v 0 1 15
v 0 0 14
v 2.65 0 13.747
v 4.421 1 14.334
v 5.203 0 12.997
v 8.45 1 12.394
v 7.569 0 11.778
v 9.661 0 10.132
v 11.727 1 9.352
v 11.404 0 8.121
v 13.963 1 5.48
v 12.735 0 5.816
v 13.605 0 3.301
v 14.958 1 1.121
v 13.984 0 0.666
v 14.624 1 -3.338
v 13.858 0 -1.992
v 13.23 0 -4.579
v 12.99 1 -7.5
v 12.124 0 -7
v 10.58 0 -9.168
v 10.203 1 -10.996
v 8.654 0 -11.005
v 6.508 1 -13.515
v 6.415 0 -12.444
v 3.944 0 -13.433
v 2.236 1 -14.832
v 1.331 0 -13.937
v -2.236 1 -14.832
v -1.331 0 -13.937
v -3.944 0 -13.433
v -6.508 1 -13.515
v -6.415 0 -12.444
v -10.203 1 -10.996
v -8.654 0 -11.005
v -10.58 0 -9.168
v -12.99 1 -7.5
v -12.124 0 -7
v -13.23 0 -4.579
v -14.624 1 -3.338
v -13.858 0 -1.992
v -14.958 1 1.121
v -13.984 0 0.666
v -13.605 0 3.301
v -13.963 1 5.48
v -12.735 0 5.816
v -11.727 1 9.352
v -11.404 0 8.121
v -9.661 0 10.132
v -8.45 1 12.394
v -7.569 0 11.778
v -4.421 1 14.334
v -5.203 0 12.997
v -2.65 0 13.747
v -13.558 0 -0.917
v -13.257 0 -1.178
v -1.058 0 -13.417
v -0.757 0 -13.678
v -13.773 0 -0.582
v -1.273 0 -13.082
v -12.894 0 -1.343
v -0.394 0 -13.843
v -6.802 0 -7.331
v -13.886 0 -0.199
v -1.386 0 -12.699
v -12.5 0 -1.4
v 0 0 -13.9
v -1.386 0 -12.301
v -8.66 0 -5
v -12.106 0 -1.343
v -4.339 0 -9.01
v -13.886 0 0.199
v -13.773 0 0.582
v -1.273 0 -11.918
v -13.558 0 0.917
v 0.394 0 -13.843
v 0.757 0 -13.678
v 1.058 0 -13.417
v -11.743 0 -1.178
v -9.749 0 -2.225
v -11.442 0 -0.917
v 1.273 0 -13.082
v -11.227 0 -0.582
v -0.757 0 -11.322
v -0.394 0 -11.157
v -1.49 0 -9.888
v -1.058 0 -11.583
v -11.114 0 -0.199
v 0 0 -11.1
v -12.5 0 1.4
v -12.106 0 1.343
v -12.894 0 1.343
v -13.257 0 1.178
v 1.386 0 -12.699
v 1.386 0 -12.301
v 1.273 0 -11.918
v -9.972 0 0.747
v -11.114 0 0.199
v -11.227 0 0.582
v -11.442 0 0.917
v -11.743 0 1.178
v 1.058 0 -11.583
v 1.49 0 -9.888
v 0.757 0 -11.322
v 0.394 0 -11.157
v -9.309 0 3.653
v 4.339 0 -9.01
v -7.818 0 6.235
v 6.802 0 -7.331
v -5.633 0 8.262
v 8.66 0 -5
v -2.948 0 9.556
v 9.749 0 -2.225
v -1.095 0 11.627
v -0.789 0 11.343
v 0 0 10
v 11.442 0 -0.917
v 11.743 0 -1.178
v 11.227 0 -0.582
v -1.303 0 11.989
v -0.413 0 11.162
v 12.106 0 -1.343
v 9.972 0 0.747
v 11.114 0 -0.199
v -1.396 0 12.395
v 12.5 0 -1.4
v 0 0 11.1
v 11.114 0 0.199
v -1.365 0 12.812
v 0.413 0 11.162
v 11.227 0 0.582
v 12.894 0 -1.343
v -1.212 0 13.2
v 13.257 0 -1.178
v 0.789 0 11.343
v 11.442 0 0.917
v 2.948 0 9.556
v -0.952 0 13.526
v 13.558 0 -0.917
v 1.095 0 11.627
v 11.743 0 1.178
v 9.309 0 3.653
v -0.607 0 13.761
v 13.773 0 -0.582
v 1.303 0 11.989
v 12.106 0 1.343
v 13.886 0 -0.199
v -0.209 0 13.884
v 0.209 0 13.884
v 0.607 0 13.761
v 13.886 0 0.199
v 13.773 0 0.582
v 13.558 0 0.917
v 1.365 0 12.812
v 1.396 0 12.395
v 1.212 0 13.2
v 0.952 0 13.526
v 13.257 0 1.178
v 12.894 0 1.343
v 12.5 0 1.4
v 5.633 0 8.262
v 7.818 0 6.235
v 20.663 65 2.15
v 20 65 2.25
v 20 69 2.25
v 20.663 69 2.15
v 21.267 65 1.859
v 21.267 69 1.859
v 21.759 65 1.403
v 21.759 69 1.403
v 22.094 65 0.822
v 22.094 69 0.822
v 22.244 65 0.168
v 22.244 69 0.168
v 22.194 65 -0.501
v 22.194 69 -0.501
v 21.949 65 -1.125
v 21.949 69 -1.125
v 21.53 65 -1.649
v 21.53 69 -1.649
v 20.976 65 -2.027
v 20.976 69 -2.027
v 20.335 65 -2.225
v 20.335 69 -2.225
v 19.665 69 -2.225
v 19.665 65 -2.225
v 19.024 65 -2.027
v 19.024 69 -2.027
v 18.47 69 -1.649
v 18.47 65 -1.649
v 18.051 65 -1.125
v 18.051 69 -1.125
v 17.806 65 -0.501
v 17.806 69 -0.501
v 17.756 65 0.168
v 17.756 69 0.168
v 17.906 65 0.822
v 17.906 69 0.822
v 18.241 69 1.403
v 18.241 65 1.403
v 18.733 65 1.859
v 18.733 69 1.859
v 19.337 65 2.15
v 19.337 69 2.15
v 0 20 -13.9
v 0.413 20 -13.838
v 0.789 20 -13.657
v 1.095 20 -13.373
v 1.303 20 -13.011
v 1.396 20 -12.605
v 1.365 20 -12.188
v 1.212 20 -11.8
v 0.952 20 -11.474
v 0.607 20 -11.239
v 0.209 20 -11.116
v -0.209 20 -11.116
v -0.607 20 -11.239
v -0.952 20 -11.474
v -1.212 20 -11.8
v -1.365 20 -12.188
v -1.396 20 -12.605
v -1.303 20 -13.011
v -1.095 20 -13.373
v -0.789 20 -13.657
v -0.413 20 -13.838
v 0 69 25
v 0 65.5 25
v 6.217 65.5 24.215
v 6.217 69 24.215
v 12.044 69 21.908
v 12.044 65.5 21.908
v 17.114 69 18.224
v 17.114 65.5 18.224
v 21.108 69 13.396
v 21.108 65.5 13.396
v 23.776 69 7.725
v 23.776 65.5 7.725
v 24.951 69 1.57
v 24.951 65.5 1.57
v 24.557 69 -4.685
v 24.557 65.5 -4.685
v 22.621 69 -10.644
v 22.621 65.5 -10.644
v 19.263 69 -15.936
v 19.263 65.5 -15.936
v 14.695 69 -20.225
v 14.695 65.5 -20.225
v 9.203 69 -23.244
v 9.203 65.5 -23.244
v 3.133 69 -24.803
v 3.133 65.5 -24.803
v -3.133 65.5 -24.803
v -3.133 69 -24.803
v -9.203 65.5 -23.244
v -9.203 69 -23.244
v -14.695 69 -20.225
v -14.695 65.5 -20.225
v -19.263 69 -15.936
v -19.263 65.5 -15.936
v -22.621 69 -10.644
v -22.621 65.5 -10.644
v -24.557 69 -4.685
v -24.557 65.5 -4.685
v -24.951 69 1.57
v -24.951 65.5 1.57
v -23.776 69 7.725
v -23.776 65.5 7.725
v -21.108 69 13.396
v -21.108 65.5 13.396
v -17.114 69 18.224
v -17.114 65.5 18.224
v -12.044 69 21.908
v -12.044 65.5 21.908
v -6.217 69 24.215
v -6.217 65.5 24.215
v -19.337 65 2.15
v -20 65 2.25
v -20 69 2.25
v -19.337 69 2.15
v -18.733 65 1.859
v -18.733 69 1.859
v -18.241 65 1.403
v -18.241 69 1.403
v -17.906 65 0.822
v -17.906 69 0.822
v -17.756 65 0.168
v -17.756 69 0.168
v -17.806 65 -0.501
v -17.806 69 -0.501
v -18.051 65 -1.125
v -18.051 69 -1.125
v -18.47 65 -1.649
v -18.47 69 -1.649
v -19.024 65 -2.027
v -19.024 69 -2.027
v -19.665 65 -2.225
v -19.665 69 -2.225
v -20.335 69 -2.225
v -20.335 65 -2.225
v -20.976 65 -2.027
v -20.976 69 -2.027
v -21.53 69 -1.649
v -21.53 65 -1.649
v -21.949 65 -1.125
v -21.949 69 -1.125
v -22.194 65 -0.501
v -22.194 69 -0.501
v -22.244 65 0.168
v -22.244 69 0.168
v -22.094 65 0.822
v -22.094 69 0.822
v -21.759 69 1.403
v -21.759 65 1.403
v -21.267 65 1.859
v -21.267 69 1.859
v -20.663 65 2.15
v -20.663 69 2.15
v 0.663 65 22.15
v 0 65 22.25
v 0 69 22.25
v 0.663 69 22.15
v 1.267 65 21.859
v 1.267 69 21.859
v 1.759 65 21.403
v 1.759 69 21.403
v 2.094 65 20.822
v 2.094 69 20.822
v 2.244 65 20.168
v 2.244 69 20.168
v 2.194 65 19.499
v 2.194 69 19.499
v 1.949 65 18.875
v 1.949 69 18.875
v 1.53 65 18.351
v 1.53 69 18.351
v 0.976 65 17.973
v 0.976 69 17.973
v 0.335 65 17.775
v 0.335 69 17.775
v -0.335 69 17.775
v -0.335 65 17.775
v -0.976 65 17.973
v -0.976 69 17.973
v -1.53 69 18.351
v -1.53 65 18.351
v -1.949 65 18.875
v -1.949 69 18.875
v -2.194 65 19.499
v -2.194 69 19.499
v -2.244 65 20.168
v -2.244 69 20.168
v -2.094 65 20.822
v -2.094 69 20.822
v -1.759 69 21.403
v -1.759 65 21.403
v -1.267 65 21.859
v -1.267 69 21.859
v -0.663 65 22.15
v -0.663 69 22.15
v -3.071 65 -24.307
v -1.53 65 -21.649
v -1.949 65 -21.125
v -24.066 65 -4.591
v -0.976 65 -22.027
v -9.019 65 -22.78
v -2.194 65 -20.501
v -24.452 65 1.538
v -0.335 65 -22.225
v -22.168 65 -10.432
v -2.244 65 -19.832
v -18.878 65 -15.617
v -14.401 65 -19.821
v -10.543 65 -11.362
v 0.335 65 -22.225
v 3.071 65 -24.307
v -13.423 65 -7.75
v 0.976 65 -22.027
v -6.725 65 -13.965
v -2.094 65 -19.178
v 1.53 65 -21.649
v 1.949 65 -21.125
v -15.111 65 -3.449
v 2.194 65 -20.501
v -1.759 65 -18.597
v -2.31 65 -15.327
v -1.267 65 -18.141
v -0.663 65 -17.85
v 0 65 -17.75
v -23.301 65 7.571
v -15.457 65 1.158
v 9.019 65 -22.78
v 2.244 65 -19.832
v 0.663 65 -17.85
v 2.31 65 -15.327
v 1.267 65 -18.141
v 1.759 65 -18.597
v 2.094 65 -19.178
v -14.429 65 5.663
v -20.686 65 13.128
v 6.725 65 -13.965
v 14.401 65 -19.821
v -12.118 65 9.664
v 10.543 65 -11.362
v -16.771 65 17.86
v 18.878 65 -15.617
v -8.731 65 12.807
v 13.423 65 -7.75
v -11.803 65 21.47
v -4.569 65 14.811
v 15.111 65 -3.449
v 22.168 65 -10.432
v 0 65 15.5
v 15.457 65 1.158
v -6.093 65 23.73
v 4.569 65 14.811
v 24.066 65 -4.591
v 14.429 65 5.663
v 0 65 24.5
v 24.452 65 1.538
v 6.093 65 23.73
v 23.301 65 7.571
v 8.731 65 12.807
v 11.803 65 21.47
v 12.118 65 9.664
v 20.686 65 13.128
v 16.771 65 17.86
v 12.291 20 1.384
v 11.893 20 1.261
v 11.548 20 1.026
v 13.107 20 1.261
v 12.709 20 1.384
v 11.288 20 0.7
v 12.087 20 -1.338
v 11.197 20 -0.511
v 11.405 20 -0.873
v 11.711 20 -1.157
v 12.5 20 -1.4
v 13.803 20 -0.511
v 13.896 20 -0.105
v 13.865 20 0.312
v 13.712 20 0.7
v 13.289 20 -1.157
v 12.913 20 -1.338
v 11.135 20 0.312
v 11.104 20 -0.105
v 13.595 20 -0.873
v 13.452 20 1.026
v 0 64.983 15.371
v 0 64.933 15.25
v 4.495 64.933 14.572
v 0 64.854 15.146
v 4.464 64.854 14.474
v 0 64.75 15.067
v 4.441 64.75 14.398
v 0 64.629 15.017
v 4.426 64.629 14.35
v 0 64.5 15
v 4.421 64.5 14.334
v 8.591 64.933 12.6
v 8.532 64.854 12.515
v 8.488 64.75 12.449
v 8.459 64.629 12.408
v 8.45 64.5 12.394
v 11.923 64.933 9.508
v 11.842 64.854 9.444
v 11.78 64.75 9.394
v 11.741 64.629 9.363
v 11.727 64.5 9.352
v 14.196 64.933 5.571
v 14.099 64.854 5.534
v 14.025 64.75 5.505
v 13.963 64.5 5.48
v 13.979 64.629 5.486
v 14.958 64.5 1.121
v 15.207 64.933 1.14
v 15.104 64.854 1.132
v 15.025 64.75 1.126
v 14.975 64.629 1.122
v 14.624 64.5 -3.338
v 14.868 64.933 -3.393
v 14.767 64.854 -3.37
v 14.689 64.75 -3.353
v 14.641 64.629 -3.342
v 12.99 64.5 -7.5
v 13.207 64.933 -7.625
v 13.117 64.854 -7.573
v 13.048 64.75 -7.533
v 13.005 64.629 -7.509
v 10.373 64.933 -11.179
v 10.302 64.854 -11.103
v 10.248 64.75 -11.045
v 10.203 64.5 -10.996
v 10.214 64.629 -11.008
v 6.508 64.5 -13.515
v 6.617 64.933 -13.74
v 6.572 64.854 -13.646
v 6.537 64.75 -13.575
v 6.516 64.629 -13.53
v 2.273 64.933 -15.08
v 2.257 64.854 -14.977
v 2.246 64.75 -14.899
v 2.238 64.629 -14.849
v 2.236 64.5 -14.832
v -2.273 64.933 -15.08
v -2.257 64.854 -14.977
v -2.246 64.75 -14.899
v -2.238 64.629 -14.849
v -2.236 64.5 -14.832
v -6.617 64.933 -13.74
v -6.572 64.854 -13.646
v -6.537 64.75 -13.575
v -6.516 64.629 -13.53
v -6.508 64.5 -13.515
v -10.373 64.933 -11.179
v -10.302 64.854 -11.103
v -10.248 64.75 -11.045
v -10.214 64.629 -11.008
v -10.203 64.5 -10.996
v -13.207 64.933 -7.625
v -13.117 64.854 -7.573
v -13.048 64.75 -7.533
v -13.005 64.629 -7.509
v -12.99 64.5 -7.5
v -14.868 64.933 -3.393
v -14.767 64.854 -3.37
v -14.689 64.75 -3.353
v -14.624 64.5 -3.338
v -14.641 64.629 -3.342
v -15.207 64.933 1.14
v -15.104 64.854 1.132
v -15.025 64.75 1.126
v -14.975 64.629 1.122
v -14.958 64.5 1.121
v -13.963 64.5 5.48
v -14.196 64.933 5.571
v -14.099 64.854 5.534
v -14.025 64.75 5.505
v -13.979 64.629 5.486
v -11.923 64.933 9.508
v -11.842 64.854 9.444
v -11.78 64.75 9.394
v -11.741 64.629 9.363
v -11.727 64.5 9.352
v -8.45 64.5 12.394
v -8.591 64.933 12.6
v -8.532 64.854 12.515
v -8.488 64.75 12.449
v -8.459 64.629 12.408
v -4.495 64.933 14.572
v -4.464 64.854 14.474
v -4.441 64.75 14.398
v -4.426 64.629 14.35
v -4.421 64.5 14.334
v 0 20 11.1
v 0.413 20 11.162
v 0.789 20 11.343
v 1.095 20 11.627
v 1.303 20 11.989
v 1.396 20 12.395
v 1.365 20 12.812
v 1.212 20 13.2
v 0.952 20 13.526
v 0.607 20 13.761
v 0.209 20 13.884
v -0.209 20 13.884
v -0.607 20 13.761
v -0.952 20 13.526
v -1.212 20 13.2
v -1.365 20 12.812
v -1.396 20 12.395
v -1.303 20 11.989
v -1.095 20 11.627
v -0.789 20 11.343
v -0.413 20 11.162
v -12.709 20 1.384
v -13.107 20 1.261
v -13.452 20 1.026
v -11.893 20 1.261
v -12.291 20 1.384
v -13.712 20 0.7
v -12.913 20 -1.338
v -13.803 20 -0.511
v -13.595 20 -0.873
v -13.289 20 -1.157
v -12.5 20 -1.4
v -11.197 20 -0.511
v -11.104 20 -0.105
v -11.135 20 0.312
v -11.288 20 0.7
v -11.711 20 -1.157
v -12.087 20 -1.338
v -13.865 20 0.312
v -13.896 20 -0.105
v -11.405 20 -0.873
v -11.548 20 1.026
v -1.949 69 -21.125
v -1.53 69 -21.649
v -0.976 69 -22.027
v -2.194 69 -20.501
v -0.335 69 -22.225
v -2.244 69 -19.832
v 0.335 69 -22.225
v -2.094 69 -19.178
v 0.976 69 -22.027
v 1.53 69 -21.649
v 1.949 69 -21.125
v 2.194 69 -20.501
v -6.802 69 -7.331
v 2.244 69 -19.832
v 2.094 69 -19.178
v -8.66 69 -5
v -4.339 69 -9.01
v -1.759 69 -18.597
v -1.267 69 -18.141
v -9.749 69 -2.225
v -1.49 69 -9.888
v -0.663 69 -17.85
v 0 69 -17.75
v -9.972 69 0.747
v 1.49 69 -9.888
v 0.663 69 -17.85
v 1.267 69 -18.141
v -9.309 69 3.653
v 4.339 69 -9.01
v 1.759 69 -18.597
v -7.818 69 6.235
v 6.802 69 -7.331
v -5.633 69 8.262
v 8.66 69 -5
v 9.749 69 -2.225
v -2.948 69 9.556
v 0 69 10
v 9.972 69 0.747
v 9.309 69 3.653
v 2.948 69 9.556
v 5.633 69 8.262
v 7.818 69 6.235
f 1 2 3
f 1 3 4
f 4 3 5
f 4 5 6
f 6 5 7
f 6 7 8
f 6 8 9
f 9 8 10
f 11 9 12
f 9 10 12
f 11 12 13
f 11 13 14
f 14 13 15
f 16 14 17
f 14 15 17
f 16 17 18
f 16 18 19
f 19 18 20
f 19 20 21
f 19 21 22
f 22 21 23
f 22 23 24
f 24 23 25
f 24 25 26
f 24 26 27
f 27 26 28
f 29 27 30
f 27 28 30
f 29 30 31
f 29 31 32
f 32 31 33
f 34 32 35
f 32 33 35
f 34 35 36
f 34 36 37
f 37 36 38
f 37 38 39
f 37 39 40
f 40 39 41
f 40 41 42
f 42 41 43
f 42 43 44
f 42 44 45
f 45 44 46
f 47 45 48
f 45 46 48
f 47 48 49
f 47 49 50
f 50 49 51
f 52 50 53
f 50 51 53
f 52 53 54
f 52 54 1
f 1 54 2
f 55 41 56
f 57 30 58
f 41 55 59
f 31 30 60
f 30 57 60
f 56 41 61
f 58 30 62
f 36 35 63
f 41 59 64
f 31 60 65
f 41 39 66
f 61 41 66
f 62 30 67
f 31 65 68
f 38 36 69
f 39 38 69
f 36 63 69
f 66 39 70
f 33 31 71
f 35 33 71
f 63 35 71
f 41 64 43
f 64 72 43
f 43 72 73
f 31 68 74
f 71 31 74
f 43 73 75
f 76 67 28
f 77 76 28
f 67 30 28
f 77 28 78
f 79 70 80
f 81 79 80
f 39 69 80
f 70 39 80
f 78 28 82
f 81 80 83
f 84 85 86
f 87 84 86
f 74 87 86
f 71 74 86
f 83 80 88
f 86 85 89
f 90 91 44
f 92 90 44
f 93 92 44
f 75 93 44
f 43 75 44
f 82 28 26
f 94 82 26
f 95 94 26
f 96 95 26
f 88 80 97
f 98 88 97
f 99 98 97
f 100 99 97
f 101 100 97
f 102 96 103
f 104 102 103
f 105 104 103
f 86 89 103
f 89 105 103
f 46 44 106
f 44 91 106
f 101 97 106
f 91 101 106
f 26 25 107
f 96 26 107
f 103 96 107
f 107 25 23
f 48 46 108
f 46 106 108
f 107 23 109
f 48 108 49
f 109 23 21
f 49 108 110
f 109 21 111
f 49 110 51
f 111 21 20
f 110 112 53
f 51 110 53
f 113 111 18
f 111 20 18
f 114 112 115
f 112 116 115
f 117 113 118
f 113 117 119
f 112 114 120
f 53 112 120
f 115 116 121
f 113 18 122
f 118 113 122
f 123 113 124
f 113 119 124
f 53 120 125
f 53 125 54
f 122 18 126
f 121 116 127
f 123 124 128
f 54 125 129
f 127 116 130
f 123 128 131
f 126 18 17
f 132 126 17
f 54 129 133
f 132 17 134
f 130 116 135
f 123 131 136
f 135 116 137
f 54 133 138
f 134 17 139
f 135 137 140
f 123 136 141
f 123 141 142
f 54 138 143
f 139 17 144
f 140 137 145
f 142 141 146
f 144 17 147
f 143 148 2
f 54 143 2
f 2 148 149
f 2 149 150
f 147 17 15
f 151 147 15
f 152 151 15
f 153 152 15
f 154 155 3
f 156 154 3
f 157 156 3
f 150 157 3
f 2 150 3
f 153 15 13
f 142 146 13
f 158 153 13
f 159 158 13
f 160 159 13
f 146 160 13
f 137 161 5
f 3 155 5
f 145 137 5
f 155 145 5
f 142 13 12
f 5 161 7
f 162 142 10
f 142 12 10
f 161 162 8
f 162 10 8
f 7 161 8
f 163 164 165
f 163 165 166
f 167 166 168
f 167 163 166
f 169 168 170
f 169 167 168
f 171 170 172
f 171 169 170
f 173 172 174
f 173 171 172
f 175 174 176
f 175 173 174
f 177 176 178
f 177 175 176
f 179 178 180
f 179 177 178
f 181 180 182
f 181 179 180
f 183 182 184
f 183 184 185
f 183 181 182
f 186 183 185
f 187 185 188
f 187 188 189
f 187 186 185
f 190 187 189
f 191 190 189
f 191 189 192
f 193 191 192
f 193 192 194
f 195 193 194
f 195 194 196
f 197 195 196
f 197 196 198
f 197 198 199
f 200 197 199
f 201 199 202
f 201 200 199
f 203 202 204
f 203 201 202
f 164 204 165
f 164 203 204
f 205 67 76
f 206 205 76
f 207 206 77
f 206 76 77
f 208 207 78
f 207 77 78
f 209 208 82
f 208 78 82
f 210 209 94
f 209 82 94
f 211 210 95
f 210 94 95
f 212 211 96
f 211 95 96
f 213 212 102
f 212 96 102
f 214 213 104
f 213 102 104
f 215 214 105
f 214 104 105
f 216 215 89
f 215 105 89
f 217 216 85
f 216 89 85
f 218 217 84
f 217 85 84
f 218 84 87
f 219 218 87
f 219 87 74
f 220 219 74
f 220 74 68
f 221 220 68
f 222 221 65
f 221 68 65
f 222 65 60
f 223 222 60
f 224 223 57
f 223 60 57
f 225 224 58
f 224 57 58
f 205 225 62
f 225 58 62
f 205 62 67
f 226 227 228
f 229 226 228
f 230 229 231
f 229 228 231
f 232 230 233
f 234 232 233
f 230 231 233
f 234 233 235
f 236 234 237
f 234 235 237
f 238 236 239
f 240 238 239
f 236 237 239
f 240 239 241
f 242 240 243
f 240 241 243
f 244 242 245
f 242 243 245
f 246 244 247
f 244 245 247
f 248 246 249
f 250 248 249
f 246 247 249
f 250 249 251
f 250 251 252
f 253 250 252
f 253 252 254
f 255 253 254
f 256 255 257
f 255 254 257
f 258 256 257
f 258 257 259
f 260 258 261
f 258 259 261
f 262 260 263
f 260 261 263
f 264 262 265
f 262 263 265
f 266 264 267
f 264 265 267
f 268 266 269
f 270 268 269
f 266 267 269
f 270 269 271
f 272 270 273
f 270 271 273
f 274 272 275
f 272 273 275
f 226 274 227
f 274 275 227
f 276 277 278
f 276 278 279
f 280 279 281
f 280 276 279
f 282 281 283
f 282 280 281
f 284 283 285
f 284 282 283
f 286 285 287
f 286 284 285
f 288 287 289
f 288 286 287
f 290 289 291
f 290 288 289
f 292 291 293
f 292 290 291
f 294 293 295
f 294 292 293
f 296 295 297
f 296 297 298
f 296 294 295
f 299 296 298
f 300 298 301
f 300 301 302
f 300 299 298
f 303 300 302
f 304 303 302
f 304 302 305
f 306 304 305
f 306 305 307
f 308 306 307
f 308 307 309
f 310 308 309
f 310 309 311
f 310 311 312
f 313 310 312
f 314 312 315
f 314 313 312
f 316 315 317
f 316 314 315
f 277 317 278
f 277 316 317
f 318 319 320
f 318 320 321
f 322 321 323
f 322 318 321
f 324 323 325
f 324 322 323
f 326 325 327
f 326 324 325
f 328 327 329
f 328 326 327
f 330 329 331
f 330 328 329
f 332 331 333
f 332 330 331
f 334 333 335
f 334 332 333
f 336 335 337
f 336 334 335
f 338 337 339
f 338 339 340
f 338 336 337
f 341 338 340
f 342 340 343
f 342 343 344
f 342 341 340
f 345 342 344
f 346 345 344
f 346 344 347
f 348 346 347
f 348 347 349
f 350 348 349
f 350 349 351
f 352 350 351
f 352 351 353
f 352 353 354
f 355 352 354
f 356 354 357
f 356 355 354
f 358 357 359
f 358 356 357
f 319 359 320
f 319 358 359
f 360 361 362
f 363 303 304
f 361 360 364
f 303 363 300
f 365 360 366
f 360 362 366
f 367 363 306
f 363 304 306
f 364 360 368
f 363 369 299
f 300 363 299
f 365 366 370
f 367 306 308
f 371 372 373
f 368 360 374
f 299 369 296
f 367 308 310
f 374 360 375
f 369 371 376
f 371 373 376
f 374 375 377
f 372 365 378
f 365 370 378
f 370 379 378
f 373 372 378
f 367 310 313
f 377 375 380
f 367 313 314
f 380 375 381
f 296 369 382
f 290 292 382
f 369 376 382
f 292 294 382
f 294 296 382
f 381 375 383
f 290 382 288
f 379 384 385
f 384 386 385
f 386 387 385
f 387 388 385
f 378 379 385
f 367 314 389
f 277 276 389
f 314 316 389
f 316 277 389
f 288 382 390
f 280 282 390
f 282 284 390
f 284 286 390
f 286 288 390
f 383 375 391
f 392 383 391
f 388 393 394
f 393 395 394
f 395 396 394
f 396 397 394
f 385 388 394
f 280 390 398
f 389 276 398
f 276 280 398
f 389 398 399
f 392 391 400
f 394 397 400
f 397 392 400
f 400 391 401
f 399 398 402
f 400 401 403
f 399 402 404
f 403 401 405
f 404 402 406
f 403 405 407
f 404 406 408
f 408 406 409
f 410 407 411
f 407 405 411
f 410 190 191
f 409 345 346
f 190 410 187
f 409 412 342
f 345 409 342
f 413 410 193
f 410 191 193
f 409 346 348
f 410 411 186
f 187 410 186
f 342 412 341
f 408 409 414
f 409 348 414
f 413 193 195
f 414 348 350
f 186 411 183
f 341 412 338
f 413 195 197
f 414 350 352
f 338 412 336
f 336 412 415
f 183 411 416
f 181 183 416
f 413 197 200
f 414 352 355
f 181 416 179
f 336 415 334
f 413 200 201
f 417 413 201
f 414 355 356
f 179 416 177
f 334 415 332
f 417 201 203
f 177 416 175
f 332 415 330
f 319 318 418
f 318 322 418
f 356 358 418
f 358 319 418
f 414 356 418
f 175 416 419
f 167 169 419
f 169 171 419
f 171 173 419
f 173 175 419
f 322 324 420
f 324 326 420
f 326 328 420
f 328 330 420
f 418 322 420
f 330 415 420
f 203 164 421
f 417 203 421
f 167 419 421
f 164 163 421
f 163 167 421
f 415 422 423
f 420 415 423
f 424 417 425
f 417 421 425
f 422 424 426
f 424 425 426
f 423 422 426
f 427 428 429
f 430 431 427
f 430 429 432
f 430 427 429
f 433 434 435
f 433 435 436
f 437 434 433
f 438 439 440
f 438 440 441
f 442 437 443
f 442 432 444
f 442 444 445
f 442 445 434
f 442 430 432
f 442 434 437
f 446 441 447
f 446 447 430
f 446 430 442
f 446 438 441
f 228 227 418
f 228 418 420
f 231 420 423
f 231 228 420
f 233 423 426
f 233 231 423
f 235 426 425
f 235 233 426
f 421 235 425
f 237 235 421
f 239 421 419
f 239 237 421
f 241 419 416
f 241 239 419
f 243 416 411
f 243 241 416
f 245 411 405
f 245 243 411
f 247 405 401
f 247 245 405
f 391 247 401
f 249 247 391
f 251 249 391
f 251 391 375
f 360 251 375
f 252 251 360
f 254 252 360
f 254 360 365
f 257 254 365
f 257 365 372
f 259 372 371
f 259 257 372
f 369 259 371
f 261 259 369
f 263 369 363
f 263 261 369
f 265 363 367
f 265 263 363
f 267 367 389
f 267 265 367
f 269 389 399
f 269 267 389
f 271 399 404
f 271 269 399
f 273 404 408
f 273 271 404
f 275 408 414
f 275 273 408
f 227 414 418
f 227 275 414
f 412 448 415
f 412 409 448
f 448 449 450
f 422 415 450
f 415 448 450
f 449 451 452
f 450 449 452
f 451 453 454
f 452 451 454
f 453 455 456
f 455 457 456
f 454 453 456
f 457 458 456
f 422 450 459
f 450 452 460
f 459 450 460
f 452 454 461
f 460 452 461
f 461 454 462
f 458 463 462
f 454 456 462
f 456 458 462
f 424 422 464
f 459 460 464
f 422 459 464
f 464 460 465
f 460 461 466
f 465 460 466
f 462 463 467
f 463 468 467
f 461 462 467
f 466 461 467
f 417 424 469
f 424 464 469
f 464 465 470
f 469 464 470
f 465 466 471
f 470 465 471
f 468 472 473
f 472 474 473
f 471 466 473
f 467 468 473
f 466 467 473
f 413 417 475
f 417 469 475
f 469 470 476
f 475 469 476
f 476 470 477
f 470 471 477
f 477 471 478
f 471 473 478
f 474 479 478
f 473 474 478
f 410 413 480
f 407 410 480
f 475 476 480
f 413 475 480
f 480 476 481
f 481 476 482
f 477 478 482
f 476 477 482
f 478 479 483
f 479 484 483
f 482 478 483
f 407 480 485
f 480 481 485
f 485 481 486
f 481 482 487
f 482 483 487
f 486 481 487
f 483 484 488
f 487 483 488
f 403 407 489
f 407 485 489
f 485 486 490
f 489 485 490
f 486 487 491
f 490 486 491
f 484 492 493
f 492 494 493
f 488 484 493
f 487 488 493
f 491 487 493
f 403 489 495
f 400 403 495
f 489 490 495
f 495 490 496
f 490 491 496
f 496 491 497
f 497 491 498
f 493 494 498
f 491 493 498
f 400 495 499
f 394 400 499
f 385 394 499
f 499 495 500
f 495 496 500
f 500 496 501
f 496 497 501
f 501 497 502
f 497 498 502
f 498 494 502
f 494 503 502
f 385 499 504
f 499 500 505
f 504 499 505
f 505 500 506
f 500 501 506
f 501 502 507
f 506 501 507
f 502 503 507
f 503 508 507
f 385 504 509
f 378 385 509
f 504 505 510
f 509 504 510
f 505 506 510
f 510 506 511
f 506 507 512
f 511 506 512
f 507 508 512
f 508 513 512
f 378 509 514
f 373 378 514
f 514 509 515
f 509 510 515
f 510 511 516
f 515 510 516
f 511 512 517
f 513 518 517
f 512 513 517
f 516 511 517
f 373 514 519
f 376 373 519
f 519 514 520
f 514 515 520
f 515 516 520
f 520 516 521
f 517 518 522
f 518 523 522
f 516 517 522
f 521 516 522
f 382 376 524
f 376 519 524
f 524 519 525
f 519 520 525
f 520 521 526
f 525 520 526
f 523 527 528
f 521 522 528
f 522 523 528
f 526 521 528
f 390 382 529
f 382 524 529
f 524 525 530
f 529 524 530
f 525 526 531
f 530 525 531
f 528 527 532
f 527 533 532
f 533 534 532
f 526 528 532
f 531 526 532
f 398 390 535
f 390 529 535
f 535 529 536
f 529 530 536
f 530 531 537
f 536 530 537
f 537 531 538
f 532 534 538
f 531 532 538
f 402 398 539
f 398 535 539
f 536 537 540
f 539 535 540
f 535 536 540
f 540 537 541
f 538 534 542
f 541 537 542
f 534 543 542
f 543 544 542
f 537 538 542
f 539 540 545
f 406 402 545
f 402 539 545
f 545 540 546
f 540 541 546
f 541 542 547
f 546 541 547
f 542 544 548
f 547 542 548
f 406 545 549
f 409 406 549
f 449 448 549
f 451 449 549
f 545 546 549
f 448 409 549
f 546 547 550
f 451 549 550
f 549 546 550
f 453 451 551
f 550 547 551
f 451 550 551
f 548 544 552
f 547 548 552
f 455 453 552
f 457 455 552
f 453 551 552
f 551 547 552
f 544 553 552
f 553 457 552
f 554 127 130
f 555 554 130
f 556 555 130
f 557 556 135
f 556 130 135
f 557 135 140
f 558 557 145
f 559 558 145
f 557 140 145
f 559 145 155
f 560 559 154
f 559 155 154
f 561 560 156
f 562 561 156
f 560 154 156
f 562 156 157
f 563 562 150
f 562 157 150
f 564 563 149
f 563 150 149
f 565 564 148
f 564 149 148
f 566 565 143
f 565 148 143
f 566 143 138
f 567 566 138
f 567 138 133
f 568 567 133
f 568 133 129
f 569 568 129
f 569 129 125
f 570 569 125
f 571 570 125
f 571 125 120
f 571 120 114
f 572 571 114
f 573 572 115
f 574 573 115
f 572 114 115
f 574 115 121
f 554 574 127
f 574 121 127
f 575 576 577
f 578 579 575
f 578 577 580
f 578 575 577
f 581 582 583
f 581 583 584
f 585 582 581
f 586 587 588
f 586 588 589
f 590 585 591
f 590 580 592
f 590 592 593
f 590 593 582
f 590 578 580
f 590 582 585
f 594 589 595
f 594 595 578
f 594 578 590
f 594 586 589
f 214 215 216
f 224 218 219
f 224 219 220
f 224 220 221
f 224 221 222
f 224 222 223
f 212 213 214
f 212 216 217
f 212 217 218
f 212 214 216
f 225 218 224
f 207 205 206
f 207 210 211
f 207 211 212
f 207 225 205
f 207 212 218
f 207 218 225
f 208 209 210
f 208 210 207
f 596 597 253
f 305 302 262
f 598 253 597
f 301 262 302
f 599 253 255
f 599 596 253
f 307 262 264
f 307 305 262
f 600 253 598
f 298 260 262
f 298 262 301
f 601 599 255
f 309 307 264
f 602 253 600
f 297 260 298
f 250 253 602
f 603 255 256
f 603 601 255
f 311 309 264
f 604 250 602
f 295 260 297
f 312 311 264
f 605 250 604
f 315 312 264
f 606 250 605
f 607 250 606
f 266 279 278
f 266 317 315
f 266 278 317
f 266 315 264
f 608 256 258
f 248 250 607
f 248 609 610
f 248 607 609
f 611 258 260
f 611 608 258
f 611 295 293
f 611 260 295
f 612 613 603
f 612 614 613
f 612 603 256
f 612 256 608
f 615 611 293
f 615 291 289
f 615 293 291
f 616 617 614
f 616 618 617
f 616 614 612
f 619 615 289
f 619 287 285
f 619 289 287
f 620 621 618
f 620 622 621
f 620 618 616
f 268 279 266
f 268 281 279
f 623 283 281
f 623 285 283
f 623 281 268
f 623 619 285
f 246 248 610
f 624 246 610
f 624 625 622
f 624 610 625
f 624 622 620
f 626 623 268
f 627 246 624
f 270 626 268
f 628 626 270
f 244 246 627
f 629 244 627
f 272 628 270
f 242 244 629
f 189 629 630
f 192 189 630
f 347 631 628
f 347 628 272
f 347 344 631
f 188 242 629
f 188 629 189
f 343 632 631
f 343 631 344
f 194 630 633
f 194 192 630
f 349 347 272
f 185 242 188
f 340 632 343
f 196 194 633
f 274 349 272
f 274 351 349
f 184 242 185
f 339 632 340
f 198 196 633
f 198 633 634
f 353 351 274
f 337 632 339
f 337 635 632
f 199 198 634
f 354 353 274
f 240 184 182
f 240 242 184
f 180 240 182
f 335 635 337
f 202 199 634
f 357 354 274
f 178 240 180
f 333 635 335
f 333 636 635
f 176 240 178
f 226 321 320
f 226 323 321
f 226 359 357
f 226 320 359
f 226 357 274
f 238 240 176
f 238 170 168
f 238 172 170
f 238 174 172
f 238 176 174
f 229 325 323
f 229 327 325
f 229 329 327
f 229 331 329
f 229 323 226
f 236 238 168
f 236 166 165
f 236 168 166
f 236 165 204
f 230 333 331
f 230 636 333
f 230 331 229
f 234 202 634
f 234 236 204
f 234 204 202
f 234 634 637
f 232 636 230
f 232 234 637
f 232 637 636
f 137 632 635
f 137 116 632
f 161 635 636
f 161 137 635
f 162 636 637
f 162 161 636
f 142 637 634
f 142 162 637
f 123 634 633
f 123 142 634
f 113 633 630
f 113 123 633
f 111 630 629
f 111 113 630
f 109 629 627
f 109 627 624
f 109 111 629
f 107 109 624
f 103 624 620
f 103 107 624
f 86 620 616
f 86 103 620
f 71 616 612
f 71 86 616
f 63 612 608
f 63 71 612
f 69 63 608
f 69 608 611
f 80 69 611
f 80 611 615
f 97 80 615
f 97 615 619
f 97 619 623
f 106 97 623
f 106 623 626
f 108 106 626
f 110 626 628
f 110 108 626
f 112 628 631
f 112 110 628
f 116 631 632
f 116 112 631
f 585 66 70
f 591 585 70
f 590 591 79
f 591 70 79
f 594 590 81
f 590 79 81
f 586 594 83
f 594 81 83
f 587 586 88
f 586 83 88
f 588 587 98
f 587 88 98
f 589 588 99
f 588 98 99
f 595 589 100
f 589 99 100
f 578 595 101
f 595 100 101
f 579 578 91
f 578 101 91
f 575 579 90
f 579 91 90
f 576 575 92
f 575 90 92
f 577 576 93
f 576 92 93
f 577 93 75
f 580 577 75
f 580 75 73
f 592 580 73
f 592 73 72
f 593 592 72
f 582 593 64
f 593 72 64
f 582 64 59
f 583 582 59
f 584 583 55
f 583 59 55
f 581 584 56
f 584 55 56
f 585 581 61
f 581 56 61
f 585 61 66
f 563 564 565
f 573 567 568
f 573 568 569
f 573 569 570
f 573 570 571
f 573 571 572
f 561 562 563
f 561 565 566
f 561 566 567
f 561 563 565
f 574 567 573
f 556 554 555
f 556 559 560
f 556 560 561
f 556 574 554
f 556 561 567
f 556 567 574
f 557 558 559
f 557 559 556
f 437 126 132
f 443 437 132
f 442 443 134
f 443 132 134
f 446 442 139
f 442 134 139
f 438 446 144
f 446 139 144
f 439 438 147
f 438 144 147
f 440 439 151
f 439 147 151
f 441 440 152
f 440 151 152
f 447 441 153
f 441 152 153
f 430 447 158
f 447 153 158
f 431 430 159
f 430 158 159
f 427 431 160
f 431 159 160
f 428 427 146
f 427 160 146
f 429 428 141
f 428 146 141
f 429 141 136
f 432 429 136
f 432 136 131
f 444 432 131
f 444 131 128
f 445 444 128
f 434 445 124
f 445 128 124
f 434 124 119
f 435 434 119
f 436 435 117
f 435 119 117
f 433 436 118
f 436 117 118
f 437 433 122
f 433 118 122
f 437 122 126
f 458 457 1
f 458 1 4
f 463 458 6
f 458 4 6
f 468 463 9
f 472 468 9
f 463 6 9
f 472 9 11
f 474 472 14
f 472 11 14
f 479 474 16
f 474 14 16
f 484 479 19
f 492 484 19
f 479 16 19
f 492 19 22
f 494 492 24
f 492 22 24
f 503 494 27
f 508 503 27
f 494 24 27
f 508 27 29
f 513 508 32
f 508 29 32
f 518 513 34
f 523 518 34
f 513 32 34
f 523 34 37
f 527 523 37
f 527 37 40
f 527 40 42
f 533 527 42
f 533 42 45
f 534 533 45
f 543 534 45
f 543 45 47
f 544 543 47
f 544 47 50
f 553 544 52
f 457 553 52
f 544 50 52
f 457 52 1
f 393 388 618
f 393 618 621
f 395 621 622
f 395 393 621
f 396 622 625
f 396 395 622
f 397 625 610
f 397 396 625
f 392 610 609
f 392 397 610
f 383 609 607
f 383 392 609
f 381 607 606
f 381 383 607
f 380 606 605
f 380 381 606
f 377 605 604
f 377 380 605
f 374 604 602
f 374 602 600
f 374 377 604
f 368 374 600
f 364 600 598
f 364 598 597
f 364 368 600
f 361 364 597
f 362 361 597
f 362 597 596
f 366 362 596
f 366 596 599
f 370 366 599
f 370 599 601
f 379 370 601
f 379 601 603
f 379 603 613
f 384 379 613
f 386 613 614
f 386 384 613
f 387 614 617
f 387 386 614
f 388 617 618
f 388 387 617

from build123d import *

# Parameters (mm, degrees)
SKETCH1_R           = 15
SKETCH1_R_2         = 10
BOSS_EXTRUDE1_DEPTH = 65
SKETCH2_R           = 25
SKETCH2_R_2         = 10
SKETCH2_R_3         = 2.25
BOSS_EXTRUDE2_DEPTH = 4
SKETCH4_R           = 1.4
CUT_EXTRUDE1_DEPTH  = 20
CHAMFER1_SIZE       = 1
CHAMFER2_SIZE       = 0.5
FILLET1_R           = 0.5


with BuildPart() as part:
    # Sketch1 → Boss-Extrude1 (new body)
    with BuildSketch(Plane(origin=(0, 0, 0), x_dir=(1, 0, 0), z_dir=(0, 1, 0))):
        with Locations(Location((0, 0, 0), (0, 0, 270))):
            Circle(SKETCH1_R)
        with Locations(Location((0, 0, 0), (0, 0, 270))):
            Circle(SKETCH1_R_2, mode=Mode.SUBTRACT)
    extrude(amount=BOSS_EXTRUDE1_DEPTH)

    # Sketch2 → Boss-Extrude2 (add)
    with BuildSketch(Plane(origin=(0, 65, 0), x_dir=(1, 0, 0), z_dir=(0, 1, 0))):
        with Locations(Location((0, 0, 0), (0, 0, 270))):
            Circle(SKETCH2_R)
        with Locations(Location((0, 0, 0), (0, 0, 270))):
            Circle(SKETCH2_R_2, mode=Mode.SUBTRACT)
        with Locations(Location((20, 0, 0), (0, 0, 270))):
            Circle(SKETCH2_R_3, mode=Mode.SUBTRACT)
        with Locations(Location((0, -20, 0), (0, 0, 270))):
            Circle(SKETCH2_R_3, mode=Mode.SUBTRACT)
        with Locations(Location((-20, 0, 0), (0, 0, 270))):
            Circle(SKETCH2_R_3, mode=Mode.SUBTRACT)
        with Locations(Location((0, 20, 0), (0, 0, 270))):
            Circle(SKETCH2_R_3, mode=Mode.SUBTRACT)
    extrude(amount=BOSS_EXTRUDE2_DEPTH)

    # Sketch4 → Cut-Extrude1 (cut)
    with BuildSketch(Plane.XZ):
        with Locations(Location((12.5, 0, 0), (0, 0, 270))):
            Circle(SKETCH4_R)
        with Locations(Location((0, -12.5, 0), (0, 0, 270))):
            Circle(SKETCH4_R)
        with Locations(Location((-12.5, 0, 0), (0, 0, 270))):
            Circle(SKETCH4_R)
        with Locations(Location((0, 12.5, 0), (0, 0, 270))):
            Circle(SKETCH4_R)
    extrude(amount=-CUT_EXTRUDE1_DEPTH, mode=Mode.SUBTRACT)

    # Chamfer1
    chamfer1_edges = [part.edges().sort_by_distance(p)[0] for p in [
        (0, 0, -15),
    ]]
    chamfer(chamfer1_edges, length=CHAMFER1_SIZE)

    # Chamfer2
    chamfer2_edges = [part.edges().sort_by_distance(p)[0] for p in [
        (0, 65, -25),
    ]]
    chamfer(chamfer2_edges, length=CHAMFER2_SIZE)

    # Fillet1
    fillet1_edges = [part.edges().sort_by_distance(p)[0] for p in [
        (0, 65, -15),
    ]]
    fillet(fillet1_edges, radius=FILLET1_R)


solid = part.part
